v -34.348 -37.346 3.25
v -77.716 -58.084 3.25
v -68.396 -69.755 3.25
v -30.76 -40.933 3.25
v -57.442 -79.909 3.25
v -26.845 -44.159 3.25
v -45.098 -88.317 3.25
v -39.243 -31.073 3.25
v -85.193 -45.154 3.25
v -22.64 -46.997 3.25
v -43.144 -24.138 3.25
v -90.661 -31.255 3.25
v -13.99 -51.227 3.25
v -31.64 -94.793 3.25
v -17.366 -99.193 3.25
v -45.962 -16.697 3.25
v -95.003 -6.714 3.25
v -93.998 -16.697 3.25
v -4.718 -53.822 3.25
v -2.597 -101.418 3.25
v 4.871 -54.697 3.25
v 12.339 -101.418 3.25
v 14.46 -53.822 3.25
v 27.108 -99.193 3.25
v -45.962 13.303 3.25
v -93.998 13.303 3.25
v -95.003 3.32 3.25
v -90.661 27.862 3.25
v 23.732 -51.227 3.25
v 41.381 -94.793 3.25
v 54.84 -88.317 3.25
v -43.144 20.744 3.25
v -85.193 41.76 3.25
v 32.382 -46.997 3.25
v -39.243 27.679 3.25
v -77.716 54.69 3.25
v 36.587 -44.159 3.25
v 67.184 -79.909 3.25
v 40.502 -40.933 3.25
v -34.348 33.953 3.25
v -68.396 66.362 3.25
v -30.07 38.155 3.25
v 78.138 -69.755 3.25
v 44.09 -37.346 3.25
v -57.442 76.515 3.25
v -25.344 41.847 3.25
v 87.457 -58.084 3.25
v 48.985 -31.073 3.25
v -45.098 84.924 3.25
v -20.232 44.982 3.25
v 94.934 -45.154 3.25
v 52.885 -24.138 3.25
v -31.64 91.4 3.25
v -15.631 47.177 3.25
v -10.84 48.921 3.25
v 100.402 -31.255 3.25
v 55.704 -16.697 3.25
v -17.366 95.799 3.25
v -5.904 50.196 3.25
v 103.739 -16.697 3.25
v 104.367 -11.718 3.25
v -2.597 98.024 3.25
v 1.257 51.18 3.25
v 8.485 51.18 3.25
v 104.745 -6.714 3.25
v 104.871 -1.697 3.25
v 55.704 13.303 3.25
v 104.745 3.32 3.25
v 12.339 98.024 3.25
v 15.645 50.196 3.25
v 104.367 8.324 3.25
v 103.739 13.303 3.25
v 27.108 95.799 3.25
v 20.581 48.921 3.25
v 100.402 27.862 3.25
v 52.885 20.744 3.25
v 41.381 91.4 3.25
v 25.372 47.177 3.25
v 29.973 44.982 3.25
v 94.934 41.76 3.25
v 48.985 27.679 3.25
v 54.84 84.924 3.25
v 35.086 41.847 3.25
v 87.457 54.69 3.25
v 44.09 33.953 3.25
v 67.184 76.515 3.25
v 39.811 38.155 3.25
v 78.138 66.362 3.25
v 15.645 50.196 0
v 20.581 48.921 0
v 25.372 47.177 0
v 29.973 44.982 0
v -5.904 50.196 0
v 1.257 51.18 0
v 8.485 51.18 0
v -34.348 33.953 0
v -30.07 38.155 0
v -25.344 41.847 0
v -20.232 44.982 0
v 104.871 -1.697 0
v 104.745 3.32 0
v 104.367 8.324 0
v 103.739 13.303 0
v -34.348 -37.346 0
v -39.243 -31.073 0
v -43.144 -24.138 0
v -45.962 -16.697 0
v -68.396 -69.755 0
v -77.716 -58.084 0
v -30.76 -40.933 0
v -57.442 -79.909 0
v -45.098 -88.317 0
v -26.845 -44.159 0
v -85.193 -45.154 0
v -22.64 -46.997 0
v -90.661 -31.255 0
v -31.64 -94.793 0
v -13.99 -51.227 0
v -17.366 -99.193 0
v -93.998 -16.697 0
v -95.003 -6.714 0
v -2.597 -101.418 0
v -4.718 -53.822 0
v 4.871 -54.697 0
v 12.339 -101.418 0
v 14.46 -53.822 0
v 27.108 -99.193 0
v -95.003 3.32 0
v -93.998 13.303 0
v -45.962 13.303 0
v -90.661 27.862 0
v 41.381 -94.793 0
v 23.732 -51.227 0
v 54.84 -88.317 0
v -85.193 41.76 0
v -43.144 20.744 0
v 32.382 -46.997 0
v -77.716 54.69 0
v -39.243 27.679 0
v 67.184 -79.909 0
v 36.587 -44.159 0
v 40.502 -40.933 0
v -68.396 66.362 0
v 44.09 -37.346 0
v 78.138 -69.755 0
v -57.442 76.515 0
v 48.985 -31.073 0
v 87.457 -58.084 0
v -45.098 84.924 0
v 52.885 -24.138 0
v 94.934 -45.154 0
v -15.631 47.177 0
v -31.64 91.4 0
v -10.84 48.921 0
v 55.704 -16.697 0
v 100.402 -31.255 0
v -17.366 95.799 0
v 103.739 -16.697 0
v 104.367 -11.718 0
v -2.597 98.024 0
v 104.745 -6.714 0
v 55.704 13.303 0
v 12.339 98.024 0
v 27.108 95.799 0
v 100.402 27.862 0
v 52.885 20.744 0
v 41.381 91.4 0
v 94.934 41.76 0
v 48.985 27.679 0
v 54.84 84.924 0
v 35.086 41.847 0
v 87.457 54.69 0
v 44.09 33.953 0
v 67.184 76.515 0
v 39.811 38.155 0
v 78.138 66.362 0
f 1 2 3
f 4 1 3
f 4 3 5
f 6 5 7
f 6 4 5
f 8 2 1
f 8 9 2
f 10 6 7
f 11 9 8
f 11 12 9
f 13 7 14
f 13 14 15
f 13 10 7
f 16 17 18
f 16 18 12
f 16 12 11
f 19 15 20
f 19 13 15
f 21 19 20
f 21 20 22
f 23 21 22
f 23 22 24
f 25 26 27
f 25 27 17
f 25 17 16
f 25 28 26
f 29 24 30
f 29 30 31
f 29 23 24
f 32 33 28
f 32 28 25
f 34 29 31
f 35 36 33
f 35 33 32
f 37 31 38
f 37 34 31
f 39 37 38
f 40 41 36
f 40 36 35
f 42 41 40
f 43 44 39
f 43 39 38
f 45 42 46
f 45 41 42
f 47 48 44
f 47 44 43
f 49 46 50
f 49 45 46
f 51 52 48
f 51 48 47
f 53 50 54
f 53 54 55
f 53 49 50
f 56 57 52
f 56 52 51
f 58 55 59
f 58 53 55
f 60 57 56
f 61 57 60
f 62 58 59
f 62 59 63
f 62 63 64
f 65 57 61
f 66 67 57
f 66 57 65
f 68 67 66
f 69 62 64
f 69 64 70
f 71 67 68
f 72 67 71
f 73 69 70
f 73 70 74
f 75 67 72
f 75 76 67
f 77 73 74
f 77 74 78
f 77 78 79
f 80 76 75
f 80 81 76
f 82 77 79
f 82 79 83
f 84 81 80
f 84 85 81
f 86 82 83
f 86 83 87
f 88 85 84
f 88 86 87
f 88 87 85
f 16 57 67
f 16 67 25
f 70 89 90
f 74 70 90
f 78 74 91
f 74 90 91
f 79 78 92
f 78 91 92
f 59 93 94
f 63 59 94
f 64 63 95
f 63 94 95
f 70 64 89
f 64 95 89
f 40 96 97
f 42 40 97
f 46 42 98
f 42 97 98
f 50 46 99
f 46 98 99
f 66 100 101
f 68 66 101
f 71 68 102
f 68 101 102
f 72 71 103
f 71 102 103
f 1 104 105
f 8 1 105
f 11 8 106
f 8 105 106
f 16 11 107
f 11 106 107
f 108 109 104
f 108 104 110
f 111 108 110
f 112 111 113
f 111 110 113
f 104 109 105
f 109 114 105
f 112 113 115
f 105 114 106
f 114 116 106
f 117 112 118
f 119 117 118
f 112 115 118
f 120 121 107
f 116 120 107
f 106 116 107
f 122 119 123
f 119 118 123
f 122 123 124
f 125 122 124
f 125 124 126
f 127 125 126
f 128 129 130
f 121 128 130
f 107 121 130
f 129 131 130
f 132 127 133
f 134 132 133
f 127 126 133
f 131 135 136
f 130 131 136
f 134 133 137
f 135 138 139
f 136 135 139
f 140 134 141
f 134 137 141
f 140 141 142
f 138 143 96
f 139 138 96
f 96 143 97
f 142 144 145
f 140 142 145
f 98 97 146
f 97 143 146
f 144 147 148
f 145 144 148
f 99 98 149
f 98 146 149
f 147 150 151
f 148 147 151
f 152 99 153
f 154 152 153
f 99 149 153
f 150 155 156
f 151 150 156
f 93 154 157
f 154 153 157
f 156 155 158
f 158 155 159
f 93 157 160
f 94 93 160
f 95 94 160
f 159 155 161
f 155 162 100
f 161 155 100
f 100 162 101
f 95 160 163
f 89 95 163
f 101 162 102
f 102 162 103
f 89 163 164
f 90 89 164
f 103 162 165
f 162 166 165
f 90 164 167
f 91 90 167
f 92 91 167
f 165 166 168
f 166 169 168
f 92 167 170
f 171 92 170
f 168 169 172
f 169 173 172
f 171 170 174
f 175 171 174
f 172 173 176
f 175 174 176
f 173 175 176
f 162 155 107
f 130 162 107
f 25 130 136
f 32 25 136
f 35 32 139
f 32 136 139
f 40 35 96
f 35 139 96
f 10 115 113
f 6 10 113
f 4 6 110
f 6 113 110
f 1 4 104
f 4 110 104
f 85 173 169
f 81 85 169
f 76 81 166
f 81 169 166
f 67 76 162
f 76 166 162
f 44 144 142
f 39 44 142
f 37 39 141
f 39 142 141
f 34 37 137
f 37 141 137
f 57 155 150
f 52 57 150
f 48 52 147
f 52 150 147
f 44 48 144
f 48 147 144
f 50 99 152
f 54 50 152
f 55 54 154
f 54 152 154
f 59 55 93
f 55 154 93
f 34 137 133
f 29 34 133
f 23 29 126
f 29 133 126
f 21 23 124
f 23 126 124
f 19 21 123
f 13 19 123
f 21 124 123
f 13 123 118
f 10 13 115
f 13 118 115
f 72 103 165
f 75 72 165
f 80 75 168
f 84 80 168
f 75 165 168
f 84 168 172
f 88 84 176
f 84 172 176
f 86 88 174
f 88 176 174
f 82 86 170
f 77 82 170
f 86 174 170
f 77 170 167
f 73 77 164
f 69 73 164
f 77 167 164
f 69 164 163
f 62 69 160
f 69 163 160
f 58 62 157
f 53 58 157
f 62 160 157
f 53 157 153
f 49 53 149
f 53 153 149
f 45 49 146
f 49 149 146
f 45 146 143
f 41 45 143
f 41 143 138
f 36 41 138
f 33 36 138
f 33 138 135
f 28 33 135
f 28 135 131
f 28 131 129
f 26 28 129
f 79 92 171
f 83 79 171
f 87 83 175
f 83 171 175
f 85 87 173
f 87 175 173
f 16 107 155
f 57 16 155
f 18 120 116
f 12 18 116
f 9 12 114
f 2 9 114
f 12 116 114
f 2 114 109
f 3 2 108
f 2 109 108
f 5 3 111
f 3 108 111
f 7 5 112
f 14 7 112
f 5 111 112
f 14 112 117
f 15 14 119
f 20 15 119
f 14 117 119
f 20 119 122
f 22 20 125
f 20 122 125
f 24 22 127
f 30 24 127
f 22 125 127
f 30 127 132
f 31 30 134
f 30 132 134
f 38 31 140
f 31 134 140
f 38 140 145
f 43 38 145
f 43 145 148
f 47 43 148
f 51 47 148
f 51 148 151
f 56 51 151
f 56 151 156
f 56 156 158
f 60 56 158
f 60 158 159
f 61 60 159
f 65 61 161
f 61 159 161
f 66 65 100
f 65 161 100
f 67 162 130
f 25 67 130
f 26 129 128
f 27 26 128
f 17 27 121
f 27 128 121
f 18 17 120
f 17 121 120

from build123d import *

# Parameters (mm, degrees)
SKETCH1_R           = 100
BOSS_EXTRUDE1_DEPTH = 3.25


with BuildPart() as part:
    # Sketch1 → Boss-Extrude1 (new body)
    with BuildSketch(Plane.XY):
        with Locations((4.870724861, -1.696758811)):
            Circle(SKETCH1_R)
        with BuildLine():
            ThreePointArc((55.70378497, -16.696758811), (4.870724861, -54.696758811), (-45.962335247, -16.696758811))
            Line((-45.962335247, -16.696758811), (55.70378497, -16.696758811))
        make_face(mode=Mode.SUBTRACT)
        with BuildLine():
            ThreePointArc((-45.962335247, 13.303241189), (4.870724861, 51.303241189), (55.70378497, 13.303241189))
            Line((55.70378497, 13.303241189), (-45.962335247, 13.303241189))
        make_face(mode=Mode.SUBTRACT)
    extrude(amount=BOSS_EXTRUDE1_DEPTH)


solid = part.part
